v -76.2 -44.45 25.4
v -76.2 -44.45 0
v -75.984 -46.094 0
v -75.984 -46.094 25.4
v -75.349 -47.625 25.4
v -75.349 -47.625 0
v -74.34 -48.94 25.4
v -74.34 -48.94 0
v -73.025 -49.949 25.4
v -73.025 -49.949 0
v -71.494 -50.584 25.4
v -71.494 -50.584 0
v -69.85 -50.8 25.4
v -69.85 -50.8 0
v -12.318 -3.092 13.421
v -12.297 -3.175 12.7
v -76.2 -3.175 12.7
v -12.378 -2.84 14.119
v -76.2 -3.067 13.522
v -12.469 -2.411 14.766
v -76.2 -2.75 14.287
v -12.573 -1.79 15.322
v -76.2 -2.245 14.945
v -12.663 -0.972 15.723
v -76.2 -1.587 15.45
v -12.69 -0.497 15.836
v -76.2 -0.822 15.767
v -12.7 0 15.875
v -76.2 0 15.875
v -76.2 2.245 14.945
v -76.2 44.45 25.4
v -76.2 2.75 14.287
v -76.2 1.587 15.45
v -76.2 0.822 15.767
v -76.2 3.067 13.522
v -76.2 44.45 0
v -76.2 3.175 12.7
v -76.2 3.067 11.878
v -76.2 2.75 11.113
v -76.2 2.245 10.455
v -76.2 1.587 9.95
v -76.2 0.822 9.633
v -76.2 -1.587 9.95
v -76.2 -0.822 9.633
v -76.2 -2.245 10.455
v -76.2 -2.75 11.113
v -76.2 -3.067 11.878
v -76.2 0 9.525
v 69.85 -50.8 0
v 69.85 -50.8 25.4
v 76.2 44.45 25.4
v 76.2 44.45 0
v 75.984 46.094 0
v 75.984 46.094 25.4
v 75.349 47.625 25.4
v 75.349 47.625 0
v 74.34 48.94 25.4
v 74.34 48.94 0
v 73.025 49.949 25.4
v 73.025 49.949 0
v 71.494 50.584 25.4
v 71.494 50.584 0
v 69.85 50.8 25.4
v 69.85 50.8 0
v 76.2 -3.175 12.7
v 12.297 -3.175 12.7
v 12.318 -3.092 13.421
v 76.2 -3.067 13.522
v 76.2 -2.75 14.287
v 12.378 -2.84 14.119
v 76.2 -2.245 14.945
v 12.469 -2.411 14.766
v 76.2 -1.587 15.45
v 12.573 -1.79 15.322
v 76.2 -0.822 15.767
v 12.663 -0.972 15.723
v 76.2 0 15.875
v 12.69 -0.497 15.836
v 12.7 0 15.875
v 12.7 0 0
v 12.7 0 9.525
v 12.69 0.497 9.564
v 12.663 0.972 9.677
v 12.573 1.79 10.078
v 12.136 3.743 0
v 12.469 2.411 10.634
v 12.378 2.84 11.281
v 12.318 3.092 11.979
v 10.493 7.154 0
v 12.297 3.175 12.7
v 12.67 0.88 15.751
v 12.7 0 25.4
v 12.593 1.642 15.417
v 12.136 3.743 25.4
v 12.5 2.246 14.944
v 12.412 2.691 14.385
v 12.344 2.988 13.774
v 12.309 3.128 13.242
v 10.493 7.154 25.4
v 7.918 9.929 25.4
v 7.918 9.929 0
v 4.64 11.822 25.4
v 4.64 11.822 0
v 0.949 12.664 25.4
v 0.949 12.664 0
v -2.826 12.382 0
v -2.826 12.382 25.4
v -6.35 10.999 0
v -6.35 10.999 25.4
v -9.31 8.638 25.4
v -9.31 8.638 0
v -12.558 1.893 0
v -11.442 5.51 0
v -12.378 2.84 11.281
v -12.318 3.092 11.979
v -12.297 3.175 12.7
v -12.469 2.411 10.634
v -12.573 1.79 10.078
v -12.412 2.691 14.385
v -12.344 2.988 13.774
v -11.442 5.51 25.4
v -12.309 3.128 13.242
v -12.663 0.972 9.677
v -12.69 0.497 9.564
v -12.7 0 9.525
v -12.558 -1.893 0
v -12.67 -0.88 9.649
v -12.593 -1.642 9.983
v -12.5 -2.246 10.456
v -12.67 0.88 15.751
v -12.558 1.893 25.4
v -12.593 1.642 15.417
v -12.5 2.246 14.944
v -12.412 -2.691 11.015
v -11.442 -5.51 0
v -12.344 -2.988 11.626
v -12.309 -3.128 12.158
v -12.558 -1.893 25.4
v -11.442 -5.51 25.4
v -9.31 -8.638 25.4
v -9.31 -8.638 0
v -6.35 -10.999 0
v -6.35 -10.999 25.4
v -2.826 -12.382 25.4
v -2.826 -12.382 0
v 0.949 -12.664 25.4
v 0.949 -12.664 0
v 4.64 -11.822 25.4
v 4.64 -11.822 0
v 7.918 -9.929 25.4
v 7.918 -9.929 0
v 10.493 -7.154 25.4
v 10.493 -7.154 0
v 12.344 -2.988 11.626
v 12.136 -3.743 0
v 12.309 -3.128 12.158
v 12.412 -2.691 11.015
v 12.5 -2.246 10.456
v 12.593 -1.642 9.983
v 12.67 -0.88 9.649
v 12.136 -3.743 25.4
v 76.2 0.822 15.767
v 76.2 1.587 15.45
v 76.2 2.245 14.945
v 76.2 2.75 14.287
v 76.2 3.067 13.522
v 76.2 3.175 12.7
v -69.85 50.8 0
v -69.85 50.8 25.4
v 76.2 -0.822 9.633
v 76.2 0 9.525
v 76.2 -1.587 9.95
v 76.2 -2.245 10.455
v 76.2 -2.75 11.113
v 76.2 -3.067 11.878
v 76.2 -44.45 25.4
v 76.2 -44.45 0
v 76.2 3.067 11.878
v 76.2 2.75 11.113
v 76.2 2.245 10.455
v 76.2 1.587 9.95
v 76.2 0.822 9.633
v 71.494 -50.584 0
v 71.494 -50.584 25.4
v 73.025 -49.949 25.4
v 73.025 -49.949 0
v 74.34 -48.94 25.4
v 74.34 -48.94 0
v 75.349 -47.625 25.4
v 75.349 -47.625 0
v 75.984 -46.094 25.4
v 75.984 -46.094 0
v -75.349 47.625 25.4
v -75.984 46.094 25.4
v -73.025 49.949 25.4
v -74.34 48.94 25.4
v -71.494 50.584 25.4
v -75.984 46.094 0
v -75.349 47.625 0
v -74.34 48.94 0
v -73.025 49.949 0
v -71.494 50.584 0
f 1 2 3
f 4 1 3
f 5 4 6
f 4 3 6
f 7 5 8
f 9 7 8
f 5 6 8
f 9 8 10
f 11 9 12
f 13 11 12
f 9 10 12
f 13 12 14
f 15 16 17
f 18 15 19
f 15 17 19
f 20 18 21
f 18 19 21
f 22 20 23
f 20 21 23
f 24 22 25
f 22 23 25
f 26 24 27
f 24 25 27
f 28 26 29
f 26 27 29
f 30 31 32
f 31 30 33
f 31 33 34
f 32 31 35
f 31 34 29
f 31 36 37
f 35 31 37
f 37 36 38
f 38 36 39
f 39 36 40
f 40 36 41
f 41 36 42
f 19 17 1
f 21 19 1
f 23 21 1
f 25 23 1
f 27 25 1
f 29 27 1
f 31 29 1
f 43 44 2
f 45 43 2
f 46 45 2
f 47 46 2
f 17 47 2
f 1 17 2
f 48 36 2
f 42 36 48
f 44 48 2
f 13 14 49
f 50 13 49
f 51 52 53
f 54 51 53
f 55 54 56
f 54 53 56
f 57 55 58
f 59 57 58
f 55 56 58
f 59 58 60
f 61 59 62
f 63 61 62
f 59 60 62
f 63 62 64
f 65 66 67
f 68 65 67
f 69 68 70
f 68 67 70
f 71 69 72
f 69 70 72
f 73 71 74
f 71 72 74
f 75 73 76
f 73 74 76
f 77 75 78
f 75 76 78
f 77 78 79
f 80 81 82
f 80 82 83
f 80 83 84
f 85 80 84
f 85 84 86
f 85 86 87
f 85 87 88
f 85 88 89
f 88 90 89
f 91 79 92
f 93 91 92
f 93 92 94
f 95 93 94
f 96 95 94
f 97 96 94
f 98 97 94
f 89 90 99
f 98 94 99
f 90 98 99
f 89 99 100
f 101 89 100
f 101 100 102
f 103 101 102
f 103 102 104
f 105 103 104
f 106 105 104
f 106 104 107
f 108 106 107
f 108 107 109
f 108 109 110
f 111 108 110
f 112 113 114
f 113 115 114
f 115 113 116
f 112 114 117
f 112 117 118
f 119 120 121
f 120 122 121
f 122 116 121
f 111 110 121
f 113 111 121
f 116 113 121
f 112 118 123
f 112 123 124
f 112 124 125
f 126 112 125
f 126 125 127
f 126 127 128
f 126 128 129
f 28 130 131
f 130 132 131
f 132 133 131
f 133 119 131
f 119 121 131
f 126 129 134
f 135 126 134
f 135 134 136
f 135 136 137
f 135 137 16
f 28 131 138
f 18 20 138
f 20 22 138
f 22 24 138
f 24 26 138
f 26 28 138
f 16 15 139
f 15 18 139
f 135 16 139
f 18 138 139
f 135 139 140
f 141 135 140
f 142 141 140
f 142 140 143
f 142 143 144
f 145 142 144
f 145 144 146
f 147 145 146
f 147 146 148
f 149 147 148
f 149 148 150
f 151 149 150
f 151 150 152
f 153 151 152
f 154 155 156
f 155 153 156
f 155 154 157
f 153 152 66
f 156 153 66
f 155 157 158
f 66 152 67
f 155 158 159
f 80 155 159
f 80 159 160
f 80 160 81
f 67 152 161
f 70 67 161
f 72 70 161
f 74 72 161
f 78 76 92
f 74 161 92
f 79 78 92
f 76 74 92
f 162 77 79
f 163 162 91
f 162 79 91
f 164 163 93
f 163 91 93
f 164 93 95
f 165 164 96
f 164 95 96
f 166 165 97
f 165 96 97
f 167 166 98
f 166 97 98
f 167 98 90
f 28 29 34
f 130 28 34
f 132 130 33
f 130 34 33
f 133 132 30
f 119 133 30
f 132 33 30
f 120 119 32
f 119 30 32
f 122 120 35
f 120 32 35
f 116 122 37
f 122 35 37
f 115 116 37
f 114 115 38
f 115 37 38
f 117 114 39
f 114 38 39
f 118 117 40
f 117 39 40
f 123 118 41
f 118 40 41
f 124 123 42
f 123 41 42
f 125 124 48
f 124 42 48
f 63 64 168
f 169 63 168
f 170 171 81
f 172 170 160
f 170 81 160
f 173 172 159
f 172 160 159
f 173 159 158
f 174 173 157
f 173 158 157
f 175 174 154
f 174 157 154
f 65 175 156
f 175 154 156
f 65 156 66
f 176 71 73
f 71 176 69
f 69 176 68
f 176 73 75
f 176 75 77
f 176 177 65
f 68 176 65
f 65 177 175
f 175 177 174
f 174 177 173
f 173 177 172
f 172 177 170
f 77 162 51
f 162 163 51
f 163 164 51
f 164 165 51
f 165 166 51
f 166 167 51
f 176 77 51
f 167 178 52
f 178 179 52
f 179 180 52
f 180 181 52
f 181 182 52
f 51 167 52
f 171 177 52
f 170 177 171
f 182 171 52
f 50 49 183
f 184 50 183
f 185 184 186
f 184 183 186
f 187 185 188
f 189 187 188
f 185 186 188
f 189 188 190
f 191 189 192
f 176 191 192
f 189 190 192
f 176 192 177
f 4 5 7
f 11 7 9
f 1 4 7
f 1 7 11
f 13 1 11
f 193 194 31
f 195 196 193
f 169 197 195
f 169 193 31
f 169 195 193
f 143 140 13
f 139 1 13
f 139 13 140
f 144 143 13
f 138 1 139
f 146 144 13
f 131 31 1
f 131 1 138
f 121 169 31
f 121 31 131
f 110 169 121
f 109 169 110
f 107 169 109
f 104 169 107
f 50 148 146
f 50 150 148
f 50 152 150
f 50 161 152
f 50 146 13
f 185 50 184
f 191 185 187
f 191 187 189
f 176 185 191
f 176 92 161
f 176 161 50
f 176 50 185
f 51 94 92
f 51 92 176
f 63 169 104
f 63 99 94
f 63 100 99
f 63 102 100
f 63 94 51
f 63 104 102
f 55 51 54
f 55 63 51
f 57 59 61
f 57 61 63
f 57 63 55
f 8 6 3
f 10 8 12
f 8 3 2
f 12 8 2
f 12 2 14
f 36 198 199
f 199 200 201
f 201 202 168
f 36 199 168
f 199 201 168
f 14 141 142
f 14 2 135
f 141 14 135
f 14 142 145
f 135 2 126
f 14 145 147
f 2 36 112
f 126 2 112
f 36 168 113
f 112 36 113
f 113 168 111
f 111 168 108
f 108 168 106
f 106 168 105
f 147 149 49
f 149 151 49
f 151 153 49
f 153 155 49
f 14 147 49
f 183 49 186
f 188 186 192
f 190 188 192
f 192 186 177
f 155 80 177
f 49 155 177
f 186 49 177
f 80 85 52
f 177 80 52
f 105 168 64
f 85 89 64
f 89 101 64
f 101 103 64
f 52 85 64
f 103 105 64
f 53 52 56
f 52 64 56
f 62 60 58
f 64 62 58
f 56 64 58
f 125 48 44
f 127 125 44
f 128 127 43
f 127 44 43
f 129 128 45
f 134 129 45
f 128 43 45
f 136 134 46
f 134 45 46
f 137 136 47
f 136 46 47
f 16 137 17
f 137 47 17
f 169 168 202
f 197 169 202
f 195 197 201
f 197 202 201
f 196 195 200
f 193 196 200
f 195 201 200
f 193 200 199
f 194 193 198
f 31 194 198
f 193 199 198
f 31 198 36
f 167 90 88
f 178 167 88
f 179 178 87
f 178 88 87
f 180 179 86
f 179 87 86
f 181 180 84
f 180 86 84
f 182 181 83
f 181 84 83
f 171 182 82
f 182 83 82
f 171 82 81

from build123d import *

# Parameters (mm, degrees)
F1_DEPTH = 25.4
F2_R     = 12.7
F3_DEPTH = 25.401
F5_DEPTH = 152.401


with BuildPart() as f1:
    # F0 (on Top) → F1 (new body)
    with BuildSketch(Plane.XY):
        with BuildLine():
            Line((69.85, 50.8), (-69.85, 50.8))
            ThreePointArc((-69.85, 50.8), (-74.340128, 48.940128), (-76.2, 44.45))
            Line((-76.2, 44.45), (-76.2, -44.45))
            ThreePointArc((-76.2, -44.45), (-74.340128, -48.940128), (-69.85, -50.8))
            Line((-69.85, -50.8), (69.85, -50.8))
            ThreePointArc((69.85, -50.8), (74.340128, -48.940128), (76.2, -44.45))
            Line((76.2, -44.45), (76.2, 44.45))
            ThreePointArc((76.2, 44.45), (74.340128, 48.940128), (69.85, 50.8))
        make_face()
    extrude(amount=F1_DEPTH)

    # F2 (on face) → F3 (cut, through all)
    with BuildSketch(Plane.XY.offset(25.4)):
        Circle(F2_R)
    extrude(amount=-F3_DEPTH, mode=Mode.SUBTRACT)

    # F4 (on face) → F5 (cut, through all)
    with BuildSketch(Plane(origin=(-76.2, 0, 0), x_dir=(0, -1, 0), z_dir=(-1, 0, 0))):
        with BuildLine():
            ThreePointArc((-3.175, 12.7), (-2.245064, 10.454936), (0, 9.525))
            Line((0, 9.525), (0, 12.7))
            Line((0, 12.7), (-3.175, 12.7))
        make_face()
        with BuildLine():
            Line((0, 12.7), (0, 9.525))
            ThreePointArc((0, 9.525), (2.245064, 10.454936), (3.175, 12.7))
            ThreePointArc((3.175, 12.7), (2.245064, 14.945064), (0, 15.875))
            Line((0, 15.875), (0, 12.7))
        make_face()
        with BuildLine():
            Line((-3.175, 12.7), (0, 12.7))
            Line((0, 12.7), (0, 15.875))
            ThreePointArc((0, 15.875), (-2.245064, 14.945064), (-3.175, 12.7))
        make_face()
    extrude(amount=-F5_DEPTH, mode=Mode.SUBTRACT)


solid = f1.part
